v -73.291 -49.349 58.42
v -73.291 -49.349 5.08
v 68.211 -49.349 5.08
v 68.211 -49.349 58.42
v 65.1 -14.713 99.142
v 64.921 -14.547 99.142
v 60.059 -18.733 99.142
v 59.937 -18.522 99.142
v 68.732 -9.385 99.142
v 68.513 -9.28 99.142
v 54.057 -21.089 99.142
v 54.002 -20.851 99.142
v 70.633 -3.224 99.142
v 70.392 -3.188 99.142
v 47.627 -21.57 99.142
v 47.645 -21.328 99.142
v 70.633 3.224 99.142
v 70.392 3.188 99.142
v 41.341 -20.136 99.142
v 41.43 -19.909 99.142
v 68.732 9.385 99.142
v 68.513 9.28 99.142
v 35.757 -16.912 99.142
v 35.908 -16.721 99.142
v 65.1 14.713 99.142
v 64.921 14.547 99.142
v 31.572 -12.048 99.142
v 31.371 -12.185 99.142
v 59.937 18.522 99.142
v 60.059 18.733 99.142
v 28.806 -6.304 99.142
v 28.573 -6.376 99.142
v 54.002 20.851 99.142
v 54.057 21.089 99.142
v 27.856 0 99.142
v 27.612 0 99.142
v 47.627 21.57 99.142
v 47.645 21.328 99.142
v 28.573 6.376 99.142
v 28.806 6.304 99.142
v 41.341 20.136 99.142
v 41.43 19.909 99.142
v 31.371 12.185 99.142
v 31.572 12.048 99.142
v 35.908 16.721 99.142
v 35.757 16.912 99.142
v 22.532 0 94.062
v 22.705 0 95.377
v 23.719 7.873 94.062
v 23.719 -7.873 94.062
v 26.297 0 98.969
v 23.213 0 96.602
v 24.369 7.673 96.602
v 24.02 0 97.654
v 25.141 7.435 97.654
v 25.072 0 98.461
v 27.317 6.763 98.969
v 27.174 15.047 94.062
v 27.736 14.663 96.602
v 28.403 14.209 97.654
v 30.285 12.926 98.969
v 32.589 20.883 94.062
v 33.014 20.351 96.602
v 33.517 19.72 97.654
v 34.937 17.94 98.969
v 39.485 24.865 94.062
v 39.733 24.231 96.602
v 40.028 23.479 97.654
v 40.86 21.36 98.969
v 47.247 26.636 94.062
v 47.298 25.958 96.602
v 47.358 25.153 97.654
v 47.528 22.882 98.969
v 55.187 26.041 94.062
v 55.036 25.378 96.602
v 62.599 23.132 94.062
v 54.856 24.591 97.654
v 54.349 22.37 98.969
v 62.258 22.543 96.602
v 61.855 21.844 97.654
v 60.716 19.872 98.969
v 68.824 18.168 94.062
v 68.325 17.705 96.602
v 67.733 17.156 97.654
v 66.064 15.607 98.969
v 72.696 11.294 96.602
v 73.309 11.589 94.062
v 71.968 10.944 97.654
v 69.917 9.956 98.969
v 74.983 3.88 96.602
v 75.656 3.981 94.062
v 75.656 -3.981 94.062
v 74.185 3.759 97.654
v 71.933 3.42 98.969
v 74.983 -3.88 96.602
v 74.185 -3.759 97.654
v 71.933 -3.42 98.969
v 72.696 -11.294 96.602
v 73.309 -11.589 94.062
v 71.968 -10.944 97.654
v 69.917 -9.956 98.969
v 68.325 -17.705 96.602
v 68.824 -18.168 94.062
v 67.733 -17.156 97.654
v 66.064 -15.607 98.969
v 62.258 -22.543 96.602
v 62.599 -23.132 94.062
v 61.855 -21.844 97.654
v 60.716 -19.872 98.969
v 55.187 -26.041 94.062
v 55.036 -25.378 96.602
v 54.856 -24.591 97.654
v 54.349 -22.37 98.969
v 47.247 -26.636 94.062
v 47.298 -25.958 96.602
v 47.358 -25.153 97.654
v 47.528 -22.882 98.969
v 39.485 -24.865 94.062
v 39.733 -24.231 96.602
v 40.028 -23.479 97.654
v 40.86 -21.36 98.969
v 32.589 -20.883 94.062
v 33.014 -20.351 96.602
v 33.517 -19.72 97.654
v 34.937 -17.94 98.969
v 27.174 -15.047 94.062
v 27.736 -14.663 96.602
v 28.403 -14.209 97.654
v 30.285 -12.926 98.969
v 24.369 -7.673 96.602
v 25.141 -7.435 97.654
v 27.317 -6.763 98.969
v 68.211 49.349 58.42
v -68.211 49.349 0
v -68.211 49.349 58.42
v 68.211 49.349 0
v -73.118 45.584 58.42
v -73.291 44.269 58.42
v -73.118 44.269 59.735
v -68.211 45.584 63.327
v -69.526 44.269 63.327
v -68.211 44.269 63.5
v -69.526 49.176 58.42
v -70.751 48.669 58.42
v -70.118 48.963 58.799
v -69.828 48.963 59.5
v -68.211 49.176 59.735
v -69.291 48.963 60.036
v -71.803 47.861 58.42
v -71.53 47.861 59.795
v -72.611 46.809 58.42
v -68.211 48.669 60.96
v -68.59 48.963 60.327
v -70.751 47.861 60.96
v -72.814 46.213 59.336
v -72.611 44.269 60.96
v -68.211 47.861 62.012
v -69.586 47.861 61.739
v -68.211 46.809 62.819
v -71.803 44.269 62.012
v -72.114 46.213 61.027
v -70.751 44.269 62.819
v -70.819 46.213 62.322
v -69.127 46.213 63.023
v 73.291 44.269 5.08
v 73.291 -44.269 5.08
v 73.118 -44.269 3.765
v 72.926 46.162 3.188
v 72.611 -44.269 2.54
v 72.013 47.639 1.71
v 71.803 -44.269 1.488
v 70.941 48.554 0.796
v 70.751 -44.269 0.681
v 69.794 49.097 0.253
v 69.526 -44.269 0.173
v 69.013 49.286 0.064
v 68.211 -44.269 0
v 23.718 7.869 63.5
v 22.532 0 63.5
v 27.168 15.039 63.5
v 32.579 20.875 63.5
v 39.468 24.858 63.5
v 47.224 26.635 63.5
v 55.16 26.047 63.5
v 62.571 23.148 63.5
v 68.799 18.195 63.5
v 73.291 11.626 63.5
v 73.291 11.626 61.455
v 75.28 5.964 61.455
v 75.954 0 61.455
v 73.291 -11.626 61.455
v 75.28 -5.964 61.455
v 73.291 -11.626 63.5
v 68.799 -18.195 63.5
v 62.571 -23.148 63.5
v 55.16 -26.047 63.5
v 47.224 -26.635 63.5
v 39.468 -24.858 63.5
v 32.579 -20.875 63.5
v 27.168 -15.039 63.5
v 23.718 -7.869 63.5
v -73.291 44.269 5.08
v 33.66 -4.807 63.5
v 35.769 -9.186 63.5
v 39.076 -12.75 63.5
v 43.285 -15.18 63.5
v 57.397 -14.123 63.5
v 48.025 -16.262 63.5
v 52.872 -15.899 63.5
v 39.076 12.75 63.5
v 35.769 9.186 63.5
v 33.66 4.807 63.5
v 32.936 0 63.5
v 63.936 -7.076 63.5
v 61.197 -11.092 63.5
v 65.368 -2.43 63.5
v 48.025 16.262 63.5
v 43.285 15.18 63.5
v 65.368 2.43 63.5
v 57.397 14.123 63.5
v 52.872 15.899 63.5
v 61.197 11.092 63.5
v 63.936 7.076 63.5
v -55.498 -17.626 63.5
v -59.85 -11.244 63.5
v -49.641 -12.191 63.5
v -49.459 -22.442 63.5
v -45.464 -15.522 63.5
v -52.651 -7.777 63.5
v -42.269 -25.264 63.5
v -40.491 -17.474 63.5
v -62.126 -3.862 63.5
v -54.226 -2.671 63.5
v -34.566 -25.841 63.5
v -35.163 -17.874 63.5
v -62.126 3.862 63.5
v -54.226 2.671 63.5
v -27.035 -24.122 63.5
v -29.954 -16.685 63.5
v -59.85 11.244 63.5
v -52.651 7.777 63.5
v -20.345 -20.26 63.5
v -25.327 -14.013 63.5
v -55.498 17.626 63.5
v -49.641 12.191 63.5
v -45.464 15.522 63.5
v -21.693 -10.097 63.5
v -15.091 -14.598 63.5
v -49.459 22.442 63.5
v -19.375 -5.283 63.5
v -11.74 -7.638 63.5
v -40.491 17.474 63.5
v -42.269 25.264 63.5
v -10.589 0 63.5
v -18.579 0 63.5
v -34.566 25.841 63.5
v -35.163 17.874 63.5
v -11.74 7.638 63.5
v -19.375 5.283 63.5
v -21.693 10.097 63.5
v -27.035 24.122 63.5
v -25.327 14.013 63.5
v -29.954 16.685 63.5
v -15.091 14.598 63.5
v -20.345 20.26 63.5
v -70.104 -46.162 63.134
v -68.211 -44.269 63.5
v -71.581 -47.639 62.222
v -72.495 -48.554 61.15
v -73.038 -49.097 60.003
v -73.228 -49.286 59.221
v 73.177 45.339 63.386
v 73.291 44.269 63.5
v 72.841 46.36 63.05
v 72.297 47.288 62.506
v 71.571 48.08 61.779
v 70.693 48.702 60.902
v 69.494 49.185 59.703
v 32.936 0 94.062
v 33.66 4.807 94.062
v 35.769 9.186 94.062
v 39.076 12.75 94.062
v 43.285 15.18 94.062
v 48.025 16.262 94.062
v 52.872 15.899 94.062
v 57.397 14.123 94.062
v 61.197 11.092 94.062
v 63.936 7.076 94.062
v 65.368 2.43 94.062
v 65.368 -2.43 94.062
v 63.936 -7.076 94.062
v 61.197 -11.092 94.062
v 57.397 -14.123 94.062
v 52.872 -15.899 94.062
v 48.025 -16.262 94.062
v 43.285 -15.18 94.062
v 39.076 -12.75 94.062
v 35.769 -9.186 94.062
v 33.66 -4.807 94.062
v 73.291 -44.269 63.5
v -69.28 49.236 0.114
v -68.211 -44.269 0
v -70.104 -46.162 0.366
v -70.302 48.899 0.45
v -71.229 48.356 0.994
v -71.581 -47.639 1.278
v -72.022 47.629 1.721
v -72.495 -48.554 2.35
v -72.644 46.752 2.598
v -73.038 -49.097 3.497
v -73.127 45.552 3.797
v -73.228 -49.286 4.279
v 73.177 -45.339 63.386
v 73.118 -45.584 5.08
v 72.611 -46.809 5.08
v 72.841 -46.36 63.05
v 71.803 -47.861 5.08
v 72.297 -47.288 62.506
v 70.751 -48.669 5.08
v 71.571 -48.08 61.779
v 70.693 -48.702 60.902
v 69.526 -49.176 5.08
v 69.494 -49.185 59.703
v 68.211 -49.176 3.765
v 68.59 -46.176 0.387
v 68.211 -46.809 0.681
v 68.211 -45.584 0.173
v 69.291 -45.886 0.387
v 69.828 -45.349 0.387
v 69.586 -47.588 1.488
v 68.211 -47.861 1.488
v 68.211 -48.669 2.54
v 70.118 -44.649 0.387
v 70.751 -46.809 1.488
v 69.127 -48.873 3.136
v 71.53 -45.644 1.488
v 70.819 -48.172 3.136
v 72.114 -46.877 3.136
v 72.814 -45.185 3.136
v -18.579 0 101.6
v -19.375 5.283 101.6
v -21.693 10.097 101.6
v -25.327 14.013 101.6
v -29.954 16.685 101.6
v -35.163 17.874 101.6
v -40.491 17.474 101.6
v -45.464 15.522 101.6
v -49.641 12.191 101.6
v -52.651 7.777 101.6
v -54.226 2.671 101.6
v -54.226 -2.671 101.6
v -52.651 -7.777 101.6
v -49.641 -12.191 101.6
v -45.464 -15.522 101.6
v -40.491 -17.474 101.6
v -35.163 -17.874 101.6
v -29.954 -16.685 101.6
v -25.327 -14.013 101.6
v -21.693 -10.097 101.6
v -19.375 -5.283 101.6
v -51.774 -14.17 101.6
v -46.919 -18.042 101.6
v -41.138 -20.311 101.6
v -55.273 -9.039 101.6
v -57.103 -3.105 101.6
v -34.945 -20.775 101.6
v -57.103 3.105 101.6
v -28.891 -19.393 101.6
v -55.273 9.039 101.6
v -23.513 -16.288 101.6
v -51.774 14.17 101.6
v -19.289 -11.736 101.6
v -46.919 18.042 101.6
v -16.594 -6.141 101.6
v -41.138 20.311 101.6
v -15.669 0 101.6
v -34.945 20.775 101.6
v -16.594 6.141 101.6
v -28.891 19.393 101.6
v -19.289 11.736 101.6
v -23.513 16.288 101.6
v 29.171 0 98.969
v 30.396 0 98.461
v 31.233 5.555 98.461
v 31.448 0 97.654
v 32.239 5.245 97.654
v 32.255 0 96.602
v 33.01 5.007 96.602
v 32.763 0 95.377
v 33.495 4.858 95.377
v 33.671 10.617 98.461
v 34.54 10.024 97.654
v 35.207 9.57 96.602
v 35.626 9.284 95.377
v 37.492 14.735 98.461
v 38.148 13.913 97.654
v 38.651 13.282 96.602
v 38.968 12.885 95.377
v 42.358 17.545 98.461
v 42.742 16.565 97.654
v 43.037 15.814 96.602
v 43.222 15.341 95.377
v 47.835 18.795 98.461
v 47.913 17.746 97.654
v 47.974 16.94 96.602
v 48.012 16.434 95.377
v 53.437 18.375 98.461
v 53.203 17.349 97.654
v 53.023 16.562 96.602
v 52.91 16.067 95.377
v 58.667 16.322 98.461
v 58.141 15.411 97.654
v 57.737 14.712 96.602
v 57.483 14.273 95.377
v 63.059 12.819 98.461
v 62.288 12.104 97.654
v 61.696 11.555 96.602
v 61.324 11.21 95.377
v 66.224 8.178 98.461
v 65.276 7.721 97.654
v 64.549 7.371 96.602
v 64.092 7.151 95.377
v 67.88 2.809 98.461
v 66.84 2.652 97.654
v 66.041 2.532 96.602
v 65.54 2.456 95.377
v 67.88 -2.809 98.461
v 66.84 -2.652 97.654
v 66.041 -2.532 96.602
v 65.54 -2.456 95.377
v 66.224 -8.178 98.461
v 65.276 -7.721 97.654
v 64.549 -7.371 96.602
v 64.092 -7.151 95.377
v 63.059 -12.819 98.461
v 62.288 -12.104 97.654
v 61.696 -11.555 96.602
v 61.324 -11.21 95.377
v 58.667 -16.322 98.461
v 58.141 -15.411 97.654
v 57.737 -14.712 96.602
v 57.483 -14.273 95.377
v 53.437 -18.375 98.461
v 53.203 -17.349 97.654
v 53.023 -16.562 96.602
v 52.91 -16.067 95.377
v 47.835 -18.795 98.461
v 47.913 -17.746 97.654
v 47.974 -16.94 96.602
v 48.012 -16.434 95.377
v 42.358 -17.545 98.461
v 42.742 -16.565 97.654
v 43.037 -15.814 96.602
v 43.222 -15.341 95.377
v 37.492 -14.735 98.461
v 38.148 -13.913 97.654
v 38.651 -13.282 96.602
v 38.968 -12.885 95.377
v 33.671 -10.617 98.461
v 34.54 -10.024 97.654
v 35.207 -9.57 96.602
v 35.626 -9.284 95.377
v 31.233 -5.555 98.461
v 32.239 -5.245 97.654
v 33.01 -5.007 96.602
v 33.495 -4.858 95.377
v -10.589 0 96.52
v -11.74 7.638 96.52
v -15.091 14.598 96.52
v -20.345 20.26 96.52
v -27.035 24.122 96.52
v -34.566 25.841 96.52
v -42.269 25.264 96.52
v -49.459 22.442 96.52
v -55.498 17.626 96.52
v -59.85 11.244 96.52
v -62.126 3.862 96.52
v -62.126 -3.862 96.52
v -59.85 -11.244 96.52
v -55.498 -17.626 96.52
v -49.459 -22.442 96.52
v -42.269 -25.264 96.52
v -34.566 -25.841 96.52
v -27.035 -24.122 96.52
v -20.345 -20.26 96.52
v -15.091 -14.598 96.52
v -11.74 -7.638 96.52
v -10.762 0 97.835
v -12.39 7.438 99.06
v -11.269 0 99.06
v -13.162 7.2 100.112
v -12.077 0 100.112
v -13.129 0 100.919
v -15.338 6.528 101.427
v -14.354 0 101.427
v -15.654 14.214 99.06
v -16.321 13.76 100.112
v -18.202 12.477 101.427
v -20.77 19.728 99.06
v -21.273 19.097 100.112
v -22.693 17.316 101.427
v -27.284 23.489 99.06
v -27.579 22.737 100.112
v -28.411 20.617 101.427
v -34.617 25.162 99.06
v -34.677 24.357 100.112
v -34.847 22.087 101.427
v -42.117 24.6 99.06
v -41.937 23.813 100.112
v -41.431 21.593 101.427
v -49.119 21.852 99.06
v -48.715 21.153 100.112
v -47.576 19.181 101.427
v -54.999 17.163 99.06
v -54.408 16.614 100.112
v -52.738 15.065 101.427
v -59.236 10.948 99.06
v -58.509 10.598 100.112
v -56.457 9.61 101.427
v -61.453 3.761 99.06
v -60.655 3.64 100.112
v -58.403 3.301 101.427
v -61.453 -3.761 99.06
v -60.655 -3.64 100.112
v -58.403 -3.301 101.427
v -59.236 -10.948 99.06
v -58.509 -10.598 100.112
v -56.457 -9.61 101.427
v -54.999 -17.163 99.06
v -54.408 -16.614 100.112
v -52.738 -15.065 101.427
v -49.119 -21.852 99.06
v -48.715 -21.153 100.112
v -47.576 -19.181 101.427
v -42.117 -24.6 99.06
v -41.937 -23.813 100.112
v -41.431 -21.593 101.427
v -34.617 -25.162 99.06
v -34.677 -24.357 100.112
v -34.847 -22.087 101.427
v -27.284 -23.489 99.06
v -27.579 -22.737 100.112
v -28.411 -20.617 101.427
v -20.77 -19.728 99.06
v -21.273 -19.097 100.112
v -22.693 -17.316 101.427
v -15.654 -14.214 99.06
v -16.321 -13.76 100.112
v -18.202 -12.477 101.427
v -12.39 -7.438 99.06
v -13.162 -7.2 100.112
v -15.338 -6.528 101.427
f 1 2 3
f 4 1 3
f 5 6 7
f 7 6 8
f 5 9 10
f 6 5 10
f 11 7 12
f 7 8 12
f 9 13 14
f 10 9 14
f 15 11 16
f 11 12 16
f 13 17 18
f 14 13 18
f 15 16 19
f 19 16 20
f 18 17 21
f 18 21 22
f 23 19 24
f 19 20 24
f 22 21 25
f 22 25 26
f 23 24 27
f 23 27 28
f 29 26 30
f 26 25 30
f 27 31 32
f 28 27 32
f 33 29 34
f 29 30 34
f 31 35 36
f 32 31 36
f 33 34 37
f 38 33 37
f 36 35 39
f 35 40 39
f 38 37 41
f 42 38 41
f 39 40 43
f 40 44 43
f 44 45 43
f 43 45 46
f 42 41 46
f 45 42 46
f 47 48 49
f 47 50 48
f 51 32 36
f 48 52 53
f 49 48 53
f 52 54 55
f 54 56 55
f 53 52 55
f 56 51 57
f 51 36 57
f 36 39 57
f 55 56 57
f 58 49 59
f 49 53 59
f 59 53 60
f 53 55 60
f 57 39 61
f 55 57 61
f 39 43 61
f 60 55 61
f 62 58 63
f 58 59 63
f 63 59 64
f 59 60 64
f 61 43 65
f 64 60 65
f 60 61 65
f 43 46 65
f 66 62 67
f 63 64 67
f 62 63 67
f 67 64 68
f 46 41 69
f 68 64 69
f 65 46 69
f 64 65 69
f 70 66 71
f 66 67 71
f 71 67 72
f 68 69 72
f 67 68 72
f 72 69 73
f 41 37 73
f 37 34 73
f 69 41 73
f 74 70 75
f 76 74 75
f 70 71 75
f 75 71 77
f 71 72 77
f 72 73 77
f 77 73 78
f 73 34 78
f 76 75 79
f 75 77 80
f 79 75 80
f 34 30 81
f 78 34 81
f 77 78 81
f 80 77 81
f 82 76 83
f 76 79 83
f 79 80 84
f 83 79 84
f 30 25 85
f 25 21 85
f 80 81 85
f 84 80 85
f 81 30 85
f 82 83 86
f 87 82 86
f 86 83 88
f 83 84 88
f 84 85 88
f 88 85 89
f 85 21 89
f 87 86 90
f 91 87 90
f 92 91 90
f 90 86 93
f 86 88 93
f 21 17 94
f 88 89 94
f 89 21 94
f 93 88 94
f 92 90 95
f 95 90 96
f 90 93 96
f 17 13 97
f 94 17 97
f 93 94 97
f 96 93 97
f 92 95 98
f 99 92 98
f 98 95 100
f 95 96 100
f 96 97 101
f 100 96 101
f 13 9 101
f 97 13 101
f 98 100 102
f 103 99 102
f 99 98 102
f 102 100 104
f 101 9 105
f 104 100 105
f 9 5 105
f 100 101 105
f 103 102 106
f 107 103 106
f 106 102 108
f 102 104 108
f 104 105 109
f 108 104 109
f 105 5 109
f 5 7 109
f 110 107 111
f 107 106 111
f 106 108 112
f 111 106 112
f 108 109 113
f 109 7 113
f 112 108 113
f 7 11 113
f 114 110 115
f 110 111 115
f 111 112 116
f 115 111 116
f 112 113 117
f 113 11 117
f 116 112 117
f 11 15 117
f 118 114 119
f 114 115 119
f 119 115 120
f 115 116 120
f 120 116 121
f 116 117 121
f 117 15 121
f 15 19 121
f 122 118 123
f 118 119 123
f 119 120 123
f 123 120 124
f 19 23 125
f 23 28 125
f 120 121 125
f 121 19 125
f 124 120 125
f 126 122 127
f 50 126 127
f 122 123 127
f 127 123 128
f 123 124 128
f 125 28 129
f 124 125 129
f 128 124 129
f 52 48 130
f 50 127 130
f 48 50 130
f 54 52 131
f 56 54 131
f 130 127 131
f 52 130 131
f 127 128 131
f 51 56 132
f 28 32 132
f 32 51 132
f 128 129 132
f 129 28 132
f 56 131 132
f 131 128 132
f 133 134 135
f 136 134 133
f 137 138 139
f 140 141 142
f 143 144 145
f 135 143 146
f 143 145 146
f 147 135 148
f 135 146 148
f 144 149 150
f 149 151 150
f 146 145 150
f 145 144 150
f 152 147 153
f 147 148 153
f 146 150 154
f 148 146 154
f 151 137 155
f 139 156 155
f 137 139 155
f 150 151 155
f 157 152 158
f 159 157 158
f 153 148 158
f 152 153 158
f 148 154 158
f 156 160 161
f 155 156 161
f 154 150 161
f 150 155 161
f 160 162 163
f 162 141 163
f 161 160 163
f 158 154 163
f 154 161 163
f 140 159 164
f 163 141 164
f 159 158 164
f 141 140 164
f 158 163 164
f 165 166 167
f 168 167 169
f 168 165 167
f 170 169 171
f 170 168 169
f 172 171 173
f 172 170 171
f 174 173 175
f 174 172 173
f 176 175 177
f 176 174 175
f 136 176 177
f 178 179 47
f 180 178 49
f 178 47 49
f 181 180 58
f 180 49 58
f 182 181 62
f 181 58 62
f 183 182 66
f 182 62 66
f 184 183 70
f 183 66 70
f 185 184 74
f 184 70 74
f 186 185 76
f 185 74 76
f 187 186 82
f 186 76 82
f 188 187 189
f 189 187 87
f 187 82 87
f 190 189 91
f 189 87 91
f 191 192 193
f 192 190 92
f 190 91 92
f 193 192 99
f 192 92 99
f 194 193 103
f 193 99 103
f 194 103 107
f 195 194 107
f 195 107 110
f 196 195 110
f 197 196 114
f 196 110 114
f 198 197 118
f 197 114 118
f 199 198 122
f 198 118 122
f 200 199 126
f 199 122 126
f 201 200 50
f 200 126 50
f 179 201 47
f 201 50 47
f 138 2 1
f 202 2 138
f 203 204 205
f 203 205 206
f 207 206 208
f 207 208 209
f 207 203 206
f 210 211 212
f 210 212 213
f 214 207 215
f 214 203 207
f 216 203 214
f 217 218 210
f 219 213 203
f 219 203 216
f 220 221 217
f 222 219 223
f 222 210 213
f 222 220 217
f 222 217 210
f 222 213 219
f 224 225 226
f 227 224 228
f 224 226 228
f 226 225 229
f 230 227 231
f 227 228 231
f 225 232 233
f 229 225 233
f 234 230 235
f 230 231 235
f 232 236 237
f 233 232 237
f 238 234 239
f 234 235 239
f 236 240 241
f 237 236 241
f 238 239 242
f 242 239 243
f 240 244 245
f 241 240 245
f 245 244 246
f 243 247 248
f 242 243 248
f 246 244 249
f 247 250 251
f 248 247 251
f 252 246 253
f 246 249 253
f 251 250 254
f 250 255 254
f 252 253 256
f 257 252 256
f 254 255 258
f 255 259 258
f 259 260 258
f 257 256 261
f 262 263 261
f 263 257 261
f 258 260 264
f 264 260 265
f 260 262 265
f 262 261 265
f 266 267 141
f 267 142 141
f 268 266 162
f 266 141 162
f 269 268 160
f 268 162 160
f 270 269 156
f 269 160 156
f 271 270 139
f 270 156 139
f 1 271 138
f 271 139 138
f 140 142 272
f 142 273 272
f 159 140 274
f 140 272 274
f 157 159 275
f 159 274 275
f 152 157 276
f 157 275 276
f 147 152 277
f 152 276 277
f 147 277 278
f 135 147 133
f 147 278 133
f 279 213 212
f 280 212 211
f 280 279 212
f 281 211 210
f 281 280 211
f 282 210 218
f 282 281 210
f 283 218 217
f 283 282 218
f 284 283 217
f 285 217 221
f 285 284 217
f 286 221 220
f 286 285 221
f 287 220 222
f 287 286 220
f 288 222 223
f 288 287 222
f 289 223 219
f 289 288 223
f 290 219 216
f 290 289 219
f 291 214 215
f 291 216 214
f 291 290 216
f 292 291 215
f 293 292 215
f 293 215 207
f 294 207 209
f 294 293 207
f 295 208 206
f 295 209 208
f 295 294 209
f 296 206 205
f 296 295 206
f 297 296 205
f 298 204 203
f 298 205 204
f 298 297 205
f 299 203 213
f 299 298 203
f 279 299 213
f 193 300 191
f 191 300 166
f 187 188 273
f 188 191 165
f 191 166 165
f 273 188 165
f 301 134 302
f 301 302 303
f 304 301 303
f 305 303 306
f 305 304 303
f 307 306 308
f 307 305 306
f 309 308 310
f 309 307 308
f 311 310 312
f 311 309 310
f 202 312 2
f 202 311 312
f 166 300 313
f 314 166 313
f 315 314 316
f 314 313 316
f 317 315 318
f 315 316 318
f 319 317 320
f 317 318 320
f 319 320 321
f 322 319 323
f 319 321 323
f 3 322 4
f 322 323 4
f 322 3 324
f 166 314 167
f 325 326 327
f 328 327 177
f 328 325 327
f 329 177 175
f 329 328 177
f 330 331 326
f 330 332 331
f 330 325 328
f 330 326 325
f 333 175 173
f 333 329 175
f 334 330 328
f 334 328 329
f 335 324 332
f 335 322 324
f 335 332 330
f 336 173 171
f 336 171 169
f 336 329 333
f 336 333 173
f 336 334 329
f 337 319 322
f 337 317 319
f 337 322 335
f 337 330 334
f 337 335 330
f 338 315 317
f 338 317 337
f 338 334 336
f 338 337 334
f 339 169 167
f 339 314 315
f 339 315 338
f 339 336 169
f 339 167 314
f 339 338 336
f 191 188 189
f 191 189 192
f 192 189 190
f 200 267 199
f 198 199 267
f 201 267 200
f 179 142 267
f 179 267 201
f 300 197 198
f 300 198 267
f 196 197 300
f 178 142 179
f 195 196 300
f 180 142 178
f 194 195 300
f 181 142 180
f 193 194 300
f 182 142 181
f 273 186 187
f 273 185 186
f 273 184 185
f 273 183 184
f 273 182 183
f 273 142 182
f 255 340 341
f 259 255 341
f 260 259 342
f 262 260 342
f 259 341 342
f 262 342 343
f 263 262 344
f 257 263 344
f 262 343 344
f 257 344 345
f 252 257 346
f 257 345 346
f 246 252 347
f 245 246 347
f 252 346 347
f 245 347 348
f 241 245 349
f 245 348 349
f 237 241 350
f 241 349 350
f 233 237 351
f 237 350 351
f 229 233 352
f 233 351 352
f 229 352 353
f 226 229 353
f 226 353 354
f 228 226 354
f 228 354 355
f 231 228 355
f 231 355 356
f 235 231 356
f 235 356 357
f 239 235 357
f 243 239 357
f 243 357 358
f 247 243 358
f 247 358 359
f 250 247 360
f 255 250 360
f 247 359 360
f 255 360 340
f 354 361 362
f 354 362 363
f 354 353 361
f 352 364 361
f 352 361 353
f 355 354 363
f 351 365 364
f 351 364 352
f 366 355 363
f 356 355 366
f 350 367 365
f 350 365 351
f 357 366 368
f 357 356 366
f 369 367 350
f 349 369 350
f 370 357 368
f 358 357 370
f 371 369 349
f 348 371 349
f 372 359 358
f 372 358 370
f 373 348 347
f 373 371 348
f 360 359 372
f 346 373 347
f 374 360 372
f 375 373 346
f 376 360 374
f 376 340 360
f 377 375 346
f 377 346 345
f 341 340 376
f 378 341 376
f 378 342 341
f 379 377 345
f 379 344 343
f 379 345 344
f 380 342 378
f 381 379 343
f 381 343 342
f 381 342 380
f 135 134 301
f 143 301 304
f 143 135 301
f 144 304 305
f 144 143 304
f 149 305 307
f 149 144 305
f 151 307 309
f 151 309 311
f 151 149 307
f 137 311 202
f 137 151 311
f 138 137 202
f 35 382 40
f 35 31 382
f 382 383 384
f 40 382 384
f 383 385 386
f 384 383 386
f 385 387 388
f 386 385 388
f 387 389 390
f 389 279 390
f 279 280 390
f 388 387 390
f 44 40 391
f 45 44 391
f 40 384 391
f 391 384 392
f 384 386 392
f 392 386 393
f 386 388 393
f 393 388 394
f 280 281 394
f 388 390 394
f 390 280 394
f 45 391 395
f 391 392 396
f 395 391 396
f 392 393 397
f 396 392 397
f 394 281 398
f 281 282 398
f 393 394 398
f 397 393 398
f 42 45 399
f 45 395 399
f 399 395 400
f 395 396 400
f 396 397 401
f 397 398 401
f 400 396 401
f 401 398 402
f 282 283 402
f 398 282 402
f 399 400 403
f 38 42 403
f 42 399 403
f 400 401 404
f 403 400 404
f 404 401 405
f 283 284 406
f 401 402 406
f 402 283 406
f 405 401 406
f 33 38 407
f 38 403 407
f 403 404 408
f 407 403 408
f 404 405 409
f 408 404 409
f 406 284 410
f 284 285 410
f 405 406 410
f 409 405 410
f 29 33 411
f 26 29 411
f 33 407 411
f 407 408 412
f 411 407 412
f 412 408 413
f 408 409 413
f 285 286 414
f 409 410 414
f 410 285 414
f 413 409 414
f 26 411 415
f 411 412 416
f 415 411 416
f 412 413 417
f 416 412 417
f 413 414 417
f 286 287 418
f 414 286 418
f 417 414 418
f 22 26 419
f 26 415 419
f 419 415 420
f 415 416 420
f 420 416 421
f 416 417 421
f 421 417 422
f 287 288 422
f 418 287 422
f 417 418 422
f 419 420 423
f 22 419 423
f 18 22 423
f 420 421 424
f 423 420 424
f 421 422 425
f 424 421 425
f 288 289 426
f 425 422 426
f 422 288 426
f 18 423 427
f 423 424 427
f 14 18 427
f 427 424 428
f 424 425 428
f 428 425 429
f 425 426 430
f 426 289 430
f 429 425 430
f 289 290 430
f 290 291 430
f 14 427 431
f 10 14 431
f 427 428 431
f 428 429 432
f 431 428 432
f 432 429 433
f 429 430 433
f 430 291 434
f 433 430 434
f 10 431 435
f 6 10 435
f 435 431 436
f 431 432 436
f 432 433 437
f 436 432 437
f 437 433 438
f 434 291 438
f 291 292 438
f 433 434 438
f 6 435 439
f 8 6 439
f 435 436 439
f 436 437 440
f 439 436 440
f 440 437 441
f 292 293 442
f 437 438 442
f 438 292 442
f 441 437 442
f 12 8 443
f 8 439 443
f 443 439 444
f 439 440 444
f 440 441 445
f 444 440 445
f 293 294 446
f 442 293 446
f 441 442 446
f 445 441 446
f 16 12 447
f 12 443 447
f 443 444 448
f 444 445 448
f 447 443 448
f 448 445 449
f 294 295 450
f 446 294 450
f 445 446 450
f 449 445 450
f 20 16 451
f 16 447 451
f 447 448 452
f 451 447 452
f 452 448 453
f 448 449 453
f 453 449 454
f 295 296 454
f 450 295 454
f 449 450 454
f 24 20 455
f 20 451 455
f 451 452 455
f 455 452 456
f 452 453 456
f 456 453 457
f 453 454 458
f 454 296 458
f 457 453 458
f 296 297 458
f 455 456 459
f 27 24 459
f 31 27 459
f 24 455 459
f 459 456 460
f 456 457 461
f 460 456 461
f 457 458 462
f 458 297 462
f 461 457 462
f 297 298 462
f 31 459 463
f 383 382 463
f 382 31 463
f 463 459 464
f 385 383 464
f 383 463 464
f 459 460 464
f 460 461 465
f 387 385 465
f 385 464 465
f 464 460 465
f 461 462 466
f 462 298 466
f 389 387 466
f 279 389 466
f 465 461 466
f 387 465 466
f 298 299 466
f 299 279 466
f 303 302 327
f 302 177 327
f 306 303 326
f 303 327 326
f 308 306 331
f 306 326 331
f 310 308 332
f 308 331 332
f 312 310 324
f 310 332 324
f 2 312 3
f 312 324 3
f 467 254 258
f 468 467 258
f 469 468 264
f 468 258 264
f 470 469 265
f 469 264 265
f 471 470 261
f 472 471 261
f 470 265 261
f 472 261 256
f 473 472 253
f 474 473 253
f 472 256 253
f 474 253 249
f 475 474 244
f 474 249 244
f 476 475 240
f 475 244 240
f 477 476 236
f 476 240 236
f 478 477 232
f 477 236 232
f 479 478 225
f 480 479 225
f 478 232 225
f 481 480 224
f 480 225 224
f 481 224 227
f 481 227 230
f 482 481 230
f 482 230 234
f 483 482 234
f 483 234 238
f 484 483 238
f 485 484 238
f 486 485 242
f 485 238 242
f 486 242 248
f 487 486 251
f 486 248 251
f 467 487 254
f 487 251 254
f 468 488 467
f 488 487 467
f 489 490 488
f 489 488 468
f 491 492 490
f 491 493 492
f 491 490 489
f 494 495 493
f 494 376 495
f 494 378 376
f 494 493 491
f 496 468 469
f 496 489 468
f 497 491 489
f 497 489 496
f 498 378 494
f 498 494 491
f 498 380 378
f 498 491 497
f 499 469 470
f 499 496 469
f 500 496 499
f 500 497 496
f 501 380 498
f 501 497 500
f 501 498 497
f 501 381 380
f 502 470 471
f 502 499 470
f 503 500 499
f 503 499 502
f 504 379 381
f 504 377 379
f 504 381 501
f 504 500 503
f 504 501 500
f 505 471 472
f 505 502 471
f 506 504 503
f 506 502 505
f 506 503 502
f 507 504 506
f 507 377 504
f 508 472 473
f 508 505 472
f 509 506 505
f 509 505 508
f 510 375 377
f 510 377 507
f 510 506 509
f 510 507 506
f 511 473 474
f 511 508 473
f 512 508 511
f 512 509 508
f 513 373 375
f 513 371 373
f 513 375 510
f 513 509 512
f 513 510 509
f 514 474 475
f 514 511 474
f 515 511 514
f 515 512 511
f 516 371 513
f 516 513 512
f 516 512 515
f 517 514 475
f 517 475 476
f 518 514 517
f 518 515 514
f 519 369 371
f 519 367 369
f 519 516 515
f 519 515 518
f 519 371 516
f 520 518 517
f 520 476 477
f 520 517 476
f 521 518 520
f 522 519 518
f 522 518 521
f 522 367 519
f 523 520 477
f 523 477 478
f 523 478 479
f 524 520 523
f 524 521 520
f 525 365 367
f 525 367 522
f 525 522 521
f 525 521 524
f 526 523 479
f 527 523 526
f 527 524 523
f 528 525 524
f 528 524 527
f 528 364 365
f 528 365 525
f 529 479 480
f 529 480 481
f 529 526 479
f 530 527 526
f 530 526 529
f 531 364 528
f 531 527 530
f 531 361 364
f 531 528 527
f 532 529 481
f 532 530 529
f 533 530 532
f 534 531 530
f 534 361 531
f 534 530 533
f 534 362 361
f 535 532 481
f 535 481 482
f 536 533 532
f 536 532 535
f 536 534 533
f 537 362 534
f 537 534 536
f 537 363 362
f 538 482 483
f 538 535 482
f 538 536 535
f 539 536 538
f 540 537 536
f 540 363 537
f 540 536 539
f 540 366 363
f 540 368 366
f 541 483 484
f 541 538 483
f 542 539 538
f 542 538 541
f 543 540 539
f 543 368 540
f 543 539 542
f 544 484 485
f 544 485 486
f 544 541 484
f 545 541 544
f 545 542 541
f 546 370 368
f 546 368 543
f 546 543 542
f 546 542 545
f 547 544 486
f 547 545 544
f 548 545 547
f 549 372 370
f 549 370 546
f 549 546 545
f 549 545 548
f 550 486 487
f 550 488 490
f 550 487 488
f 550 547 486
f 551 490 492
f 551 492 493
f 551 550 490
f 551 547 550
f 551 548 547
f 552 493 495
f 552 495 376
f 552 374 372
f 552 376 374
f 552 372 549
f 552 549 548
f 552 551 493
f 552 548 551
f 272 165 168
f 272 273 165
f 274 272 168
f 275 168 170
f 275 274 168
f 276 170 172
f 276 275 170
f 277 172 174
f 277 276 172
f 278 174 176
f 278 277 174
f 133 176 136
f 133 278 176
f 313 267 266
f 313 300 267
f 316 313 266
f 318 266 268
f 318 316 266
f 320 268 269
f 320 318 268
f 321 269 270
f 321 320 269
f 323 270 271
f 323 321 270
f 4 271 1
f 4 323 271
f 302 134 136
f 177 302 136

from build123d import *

# Parameters (mm, degrees)
F0_W     = 146.582454443
F0_H     = 98.6987948418
F1_DEPTH = 63.5
F2_R     = 25.913642442
F3_DEPTH = 38.1
F4_R     = 17.9236546868
F5_DEPTH = 38.1
F6_W     = 10.4035940021
F6_H     = 37.6868881285
F8_R     = 5.08
F8_2_R   = 5.08


with BuildPart() as f1:
    # F0 (on Top) → F1 (new body)
    with BuildSketch(Plane.XY):
        Rectangle(F0_W, F0_H)
    extrude(amount=F1_DEPTH)

    # F6 (on Front) → F7 (revolve)
    with BuildSketch(Plane.XZ):
        with Locations((27.7340533212, 80.2984889597)):
            Rectangle(F6_W, F6_H)
    revolve(axis=Axis((49.2432229221, 0, 63.3361302316), (0, 0, -1)))

    # F8
    f8_edges = [f1.edges().sort_by_distance(p)[0] for p in [
        (75.95419, 0, 99.141933),
        (65.550596, 0, 99.141933),
        (0, -49.349397, 63.5),
        (73.291227, -49.349397, 31.75),
        (0, -49.349397, 0),
        (73.291227, 49.349397, 31.75),
        (73.291227, 0, 0),
        (-73.291227, 0, 63.5),
        (-73.291227, 49.349397, 31.75),
        (0, 49.349397, 63.5),
        (-73.291227, 0, 0),
    ]]
    fillet(f8_edges, radius=F8_R)


with BuildPart() as f3:
    # F2 (on face) → F3 (new body)
    with BuildSketch(Plane.XY.offset(63.5)):
        with Locations((-36.5022569895, 0)):
            Circle(F2_R)
    extrude(amount=F3_DEPTH)

    # F4 (on face) → F5 (cut, through all)
    with BuildSketch(Plane.XY.offset(101.6)):
        with Locations((-36.5022569895, 0)):
            Circle(F4_R)
    extrude(amount=-F5_DEPTH, mode=Mode.SUBTRACT)

    # F8#2
    f8_2_edges = [f3.edges().sort_by_distance(p)[0] for p in [
        (-62.415899, 0, 101.6),
    ]]
    fillet(f8_2_edges, radius=F8_2_R)


solid = Compound([f1.part, f3.part])
